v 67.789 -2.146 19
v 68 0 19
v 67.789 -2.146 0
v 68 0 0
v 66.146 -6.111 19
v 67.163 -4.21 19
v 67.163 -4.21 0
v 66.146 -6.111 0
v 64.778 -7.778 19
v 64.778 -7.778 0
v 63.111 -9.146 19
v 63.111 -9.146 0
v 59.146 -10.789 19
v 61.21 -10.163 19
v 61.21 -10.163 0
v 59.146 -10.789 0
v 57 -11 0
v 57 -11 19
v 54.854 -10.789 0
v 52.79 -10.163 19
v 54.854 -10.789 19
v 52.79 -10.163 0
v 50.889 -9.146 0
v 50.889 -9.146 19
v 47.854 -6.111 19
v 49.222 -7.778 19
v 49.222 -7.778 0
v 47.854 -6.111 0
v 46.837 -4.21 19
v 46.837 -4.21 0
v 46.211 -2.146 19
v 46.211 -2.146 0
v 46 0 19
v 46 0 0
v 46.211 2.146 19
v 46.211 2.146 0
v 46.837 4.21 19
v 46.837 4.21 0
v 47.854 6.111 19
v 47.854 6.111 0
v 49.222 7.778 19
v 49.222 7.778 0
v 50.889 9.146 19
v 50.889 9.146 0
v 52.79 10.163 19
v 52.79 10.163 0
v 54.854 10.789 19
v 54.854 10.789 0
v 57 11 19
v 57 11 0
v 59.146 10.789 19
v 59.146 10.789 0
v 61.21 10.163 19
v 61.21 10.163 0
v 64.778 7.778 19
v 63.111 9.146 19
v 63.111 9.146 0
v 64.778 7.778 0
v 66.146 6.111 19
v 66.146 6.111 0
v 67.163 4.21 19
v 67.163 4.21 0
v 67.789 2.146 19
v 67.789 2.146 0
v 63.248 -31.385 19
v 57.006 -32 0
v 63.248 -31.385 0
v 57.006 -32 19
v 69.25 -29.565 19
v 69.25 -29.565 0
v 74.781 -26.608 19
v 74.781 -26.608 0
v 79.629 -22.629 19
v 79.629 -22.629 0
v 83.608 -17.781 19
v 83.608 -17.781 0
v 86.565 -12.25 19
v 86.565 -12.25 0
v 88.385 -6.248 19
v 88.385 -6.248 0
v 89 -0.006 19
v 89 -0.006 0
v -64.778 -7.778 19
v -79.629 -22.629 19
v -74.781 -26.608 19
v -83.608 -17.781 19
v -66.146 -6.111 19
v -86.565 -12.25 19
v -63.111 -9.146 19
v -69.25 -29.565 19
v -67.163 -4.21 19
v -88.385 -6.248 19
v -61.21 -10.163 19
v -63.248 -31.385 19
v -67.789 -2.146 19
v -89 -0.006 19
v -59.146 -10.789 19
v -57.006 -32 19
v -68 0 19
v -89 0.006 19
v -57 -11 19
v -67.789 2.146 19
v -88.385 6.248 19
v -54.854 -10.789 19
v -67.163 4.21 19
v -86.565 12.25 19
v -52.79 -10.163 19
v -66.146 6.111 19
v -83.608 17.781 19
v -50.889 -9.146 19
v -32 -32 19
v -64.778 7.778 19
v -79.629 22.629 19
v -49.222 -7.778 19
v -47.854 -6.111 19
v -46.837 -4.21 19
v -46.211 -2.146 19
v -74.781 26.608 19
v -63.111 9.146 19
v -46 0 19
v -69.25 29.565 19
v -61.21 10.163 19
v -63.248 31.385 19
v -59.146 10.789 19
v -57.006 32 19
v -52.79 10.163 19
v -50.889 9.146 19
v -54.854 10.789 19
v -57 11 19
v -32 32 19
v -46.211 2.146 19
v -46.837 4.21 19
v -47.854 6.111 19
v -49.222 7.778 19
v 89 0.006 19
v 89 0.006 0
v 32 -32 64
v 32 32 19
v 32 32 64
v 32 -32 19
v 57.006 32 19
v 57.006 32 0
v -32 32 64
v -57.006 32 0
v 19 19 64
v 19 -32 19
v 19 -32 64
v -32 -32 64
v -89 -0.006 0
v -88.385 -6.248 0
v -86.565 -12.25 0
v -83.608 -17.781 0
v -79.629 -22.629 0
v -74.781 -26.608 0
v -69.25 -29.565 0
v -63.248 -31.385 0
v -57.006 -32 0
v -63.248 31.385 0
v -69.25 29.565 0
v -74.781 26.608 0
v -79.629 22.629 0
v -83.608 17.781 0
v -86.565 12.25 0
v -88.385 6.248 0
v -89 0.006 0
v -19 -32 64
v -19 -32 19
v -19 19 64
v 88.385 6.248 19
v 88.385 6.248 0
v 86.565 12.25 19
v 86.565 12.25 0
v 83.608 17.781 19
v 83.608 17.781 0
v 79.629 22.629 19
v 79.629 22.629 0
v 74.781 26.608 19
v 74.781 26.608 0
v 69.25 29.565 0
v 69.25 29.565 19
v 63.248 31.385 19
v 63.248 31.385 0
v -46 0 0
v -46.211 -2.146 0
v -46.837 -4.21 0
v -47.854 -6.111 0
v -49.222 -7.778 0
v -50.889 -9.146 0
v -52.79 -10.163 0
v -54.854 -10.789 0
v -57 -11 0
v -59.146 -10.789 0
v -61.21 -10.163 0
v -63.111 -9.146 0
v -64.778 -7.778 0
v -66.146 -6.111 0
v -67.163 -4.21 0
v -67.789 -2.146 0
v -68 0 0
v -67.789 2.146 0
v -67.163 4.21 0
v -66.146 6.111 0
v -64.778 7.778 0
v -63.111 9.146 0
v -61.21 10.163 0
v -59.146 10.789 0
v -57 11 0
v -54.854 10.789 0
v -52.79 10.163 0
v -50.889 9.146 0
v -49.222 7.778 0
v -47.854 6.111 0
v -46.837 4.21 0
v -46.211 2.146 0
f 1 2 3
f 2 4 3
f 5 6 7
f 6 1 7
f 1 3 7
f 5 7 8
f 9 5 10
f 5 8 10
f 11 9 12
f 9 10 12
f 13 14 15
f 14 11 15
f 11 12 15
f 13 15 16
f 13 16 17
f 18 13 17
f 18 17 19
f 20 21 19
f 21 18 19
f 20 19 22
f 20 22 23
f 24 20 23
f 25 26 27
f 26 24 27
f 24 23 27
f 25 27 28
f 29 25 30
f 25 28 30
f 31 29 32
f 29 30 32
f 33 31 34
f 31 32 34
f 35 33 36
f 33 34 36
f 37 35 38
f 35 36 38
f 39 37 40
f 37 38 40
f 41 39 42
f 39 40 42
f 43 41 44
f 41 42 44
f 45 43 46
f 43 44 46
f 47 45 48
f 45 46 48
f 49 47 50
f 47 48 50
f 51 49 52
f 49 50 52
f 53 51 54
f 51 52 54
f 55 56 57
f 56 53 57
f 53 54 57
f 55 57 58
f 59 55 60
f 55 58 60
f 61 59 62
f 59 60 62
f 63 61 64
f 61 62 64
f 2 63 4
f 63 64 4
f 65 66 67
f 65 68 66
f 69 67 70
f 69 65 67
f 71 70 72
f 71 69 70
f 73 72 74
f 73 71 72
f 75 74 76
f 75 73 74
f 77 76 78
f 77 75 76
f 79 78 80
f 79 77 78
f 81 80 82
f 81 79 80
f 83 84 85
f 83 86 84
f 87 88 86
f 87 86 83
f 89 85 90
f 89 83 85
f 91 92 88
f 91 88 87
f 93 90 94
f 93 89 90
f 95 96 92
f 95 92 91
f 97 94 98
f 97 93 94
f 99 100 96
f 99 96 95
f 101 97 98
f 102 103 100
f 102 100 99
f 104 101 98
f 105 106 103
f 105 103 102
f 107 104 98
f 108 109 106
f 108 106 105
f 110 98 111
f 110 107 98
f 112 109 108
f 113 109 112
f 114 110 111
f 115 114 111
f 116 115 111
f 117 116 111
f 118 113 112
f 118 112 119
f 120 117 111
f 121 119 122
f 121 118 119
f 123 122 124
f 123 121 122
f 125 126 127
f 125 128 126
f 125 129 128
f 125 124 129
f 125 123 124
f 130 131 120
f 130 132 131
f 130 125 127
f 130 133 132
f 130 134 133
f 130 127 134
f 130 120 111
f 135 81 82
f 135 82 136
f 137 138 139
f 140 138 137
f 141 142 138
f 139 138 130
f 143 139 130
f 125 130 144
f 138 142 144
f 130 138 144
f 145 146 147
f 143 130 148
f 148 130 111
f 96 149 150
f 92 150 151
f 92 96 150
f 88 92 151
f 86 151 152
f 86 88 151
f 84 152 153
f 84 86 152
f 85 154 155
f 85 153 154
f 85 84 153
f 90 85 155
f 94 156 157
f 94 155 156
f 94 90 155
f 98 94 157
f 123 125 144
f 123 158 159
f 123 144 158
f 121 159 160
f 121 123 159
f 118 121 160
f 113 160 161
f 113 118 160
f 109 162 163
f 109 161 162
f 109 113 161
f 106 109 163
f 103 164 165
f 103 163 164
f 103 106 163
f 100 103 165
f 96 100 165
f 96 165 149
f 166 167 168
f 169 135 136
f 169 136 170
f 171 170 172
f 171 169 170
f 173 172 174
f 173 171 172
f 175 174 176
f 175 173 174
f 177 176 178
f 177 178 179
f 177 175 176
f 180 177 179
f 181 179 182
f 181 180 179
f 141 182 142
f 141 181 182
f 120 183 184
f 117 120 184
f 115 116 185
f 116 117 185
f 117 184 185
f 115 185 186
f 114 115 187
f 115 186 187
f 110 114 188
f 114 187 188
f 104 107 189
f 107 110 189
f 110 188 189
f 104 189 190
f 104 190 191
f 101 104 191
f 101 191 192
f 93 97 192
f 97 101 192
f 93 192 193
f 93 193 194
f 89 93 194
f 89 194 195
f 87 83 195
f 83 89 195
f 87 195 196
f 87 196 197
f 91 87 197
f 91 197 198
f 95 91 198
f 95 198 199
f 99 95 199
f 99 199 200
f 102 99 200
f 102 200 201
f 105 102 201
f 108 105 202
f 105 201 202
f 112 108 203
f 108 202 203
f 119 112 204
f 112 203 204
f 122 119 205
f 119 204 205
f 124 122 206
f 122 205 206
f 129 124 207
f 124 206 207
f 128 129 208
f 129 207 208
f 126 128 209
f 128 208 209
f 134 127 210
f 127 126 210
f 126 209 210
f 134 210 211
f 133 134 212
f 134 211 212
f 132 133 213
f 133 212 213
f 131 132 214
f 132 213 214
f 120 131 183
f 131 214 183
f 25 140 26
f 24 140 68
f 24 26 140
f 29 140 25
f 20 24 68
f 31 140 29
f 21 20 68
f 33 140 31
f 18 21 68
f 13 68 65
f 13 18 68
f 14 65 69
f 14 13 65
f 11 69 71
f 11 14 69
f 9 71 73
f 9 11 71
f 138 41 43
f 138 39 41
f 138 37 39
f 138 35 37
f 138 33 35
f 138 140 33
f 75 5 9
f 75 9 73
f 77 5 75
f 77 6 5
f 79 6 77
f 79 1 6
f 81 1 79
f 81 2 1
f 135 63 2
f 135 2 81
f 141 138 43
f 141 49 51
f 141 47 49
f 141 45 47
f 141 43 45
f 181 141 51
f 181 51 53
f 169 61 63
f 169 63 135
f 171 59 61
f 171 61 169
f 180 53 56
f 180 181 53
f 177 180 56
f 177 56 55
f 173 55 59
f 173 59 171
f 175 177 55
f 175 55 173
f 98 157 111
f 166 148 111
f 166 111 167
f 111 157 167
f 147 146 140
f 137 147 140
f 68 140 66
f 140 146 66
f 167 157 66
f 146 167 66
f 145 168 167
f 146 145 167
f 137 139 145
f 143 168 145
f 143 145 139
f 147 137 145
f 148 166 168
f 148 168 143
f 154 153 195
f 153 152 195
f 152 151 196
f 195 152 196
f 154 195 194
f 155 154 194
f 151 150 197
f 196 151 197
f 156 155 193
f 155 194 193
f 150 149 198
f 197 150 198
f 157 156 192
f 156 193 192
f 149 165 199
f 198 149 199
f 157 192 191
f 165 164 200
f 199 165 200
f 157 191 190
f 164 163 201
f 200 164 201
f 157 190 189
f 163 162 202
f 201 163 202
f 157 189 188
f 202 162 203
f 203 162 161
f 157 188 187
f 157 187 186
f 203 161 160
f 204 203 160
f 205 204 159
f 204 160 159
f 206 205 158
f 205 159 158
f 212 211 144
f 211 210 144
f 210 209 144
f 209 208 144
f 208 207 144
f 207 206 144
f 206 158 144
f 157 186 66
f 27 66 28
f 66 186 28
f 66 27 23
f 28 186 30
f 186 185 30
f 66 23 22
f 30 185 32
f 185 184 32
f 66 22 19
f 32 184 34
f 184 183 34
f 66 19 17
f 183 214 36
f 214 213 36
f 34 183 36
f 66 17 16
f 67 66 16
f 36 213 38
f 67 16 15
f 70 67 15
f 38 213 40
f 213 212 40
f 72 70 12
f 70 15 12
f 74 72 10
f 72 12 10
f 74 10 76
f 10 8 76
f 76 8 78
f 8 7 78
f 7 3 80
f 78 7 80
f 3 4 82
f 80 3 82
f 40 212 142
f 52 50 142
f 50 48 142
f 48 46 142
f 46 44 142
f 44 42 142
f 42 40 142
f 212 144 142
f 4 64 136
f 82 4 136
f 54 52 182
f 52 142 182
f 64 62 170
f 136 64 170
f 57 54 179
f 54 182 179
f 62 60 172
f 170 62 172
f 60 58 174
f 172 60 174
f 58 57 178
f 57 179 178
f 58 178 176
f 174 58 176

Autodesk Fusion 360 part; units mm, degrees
sketch "Sketch1" plane through (0, 0, 0) normal (0, 0, 1) x (1, 0, 0)
  line L0 (89, 32) -> (-89, 32)
  line L1 (-89, 32) -> (-89, -32)
  line L2 (-89, -32) -> (89, -32)
  line L3 (89, -32) -> (89, 32)
  line L4 (89, 32) -> (-89, -32) construction
  line L5 (-89, 32) -> (89, -32) construction
  circle A0 centre (-57, 0) radius 11
  circle A1 centre (57, 0) radius 11
  dimension "d1" = 178
  dimension "d2" = 64
  dimension "d13" = 22
  dimension "d14" = 22
  dimension "d21" = 114
extrude "Extrude2" add sketch "Sketch1" along normal blind 19
fillet "Fillet3" radius 32 2 edges at (-89, -32, 9.5) (-89, 32, 9.5)
fillet "Fillet4" radius 32 2 edges at (89, -32, 9.5) (89, 32, 9.5)
sketch "Sketch2" plane through (0, 0, 19) normal (0, 0, 1) x (-1, 0, 0)
  arc A0 (-57, 32) -> (-57, -32) centre (-57, 0) ccw
  line L0 (-57, -32) -> (57, -32)
  arc A1 (57, -32) -> (57, 32) centre (57, 0) ccw
  line L1 (57, 32) -> (-57, 32)
  circle A2 centre (-57, 0) radius 11
  circle A3 centre (57, 0) radius 11
  line L2 (0, -32) -> (32, -32)
  line L3 (0, -32) -> (-32, -32)
  line L4 (32, -32) -> (32, 32)
  line L5 (-32, -32) -> (-32, 32)
  line L6 (32, 32) -> (19, 32)
  line L7 (-32, 32) -> (-19, 32)
  line L8 (19, 32) -> (19, -19)
  line L9 (-19, 32) -> (-19, -19)
  line L10 (19, -19) -> (-19, -19)
  dimension "d22" = 32
  dimension "d23" = 32
  dimension "d28" = 13
  dimension "d29" = 13
  dimension "d30" = 51
  dimension "d31" = 51
extrude "Extrude3" add sketch "Sketch2" along normal blind 45 contours L0 L1 L2 L3 L4 L5 L6 L7 L8 L9 L10
sketch "Sketch3" plane through (19, 0, 0) normal (-1, 0, 0) x (0, -1, 0)
  line L0 (-19, 19) -> (32, 19)
  line L1 (32, 19) -> (32, 64)
  line L2 (32, 64) -> (-19, 64)
  line L3 (-19, 64) -> (-19, 19)
sketch "Sketch4" plane through (0, 0, 0) normal (1, 0, 0) x (0, 1, 0)
  line L0 (19, 19) -> (-32, 19)
  line L1 (19, 19) -> (19, 64)
  line L2 (19, 64) -> (-32, 19)
  dimension "d34" = 51
  dimension "d35" = 45
extrude "Extrude4" add sketch "Sketch4" along normal mid plane 38
equation "d32 = 64 mm - 19 mm"
